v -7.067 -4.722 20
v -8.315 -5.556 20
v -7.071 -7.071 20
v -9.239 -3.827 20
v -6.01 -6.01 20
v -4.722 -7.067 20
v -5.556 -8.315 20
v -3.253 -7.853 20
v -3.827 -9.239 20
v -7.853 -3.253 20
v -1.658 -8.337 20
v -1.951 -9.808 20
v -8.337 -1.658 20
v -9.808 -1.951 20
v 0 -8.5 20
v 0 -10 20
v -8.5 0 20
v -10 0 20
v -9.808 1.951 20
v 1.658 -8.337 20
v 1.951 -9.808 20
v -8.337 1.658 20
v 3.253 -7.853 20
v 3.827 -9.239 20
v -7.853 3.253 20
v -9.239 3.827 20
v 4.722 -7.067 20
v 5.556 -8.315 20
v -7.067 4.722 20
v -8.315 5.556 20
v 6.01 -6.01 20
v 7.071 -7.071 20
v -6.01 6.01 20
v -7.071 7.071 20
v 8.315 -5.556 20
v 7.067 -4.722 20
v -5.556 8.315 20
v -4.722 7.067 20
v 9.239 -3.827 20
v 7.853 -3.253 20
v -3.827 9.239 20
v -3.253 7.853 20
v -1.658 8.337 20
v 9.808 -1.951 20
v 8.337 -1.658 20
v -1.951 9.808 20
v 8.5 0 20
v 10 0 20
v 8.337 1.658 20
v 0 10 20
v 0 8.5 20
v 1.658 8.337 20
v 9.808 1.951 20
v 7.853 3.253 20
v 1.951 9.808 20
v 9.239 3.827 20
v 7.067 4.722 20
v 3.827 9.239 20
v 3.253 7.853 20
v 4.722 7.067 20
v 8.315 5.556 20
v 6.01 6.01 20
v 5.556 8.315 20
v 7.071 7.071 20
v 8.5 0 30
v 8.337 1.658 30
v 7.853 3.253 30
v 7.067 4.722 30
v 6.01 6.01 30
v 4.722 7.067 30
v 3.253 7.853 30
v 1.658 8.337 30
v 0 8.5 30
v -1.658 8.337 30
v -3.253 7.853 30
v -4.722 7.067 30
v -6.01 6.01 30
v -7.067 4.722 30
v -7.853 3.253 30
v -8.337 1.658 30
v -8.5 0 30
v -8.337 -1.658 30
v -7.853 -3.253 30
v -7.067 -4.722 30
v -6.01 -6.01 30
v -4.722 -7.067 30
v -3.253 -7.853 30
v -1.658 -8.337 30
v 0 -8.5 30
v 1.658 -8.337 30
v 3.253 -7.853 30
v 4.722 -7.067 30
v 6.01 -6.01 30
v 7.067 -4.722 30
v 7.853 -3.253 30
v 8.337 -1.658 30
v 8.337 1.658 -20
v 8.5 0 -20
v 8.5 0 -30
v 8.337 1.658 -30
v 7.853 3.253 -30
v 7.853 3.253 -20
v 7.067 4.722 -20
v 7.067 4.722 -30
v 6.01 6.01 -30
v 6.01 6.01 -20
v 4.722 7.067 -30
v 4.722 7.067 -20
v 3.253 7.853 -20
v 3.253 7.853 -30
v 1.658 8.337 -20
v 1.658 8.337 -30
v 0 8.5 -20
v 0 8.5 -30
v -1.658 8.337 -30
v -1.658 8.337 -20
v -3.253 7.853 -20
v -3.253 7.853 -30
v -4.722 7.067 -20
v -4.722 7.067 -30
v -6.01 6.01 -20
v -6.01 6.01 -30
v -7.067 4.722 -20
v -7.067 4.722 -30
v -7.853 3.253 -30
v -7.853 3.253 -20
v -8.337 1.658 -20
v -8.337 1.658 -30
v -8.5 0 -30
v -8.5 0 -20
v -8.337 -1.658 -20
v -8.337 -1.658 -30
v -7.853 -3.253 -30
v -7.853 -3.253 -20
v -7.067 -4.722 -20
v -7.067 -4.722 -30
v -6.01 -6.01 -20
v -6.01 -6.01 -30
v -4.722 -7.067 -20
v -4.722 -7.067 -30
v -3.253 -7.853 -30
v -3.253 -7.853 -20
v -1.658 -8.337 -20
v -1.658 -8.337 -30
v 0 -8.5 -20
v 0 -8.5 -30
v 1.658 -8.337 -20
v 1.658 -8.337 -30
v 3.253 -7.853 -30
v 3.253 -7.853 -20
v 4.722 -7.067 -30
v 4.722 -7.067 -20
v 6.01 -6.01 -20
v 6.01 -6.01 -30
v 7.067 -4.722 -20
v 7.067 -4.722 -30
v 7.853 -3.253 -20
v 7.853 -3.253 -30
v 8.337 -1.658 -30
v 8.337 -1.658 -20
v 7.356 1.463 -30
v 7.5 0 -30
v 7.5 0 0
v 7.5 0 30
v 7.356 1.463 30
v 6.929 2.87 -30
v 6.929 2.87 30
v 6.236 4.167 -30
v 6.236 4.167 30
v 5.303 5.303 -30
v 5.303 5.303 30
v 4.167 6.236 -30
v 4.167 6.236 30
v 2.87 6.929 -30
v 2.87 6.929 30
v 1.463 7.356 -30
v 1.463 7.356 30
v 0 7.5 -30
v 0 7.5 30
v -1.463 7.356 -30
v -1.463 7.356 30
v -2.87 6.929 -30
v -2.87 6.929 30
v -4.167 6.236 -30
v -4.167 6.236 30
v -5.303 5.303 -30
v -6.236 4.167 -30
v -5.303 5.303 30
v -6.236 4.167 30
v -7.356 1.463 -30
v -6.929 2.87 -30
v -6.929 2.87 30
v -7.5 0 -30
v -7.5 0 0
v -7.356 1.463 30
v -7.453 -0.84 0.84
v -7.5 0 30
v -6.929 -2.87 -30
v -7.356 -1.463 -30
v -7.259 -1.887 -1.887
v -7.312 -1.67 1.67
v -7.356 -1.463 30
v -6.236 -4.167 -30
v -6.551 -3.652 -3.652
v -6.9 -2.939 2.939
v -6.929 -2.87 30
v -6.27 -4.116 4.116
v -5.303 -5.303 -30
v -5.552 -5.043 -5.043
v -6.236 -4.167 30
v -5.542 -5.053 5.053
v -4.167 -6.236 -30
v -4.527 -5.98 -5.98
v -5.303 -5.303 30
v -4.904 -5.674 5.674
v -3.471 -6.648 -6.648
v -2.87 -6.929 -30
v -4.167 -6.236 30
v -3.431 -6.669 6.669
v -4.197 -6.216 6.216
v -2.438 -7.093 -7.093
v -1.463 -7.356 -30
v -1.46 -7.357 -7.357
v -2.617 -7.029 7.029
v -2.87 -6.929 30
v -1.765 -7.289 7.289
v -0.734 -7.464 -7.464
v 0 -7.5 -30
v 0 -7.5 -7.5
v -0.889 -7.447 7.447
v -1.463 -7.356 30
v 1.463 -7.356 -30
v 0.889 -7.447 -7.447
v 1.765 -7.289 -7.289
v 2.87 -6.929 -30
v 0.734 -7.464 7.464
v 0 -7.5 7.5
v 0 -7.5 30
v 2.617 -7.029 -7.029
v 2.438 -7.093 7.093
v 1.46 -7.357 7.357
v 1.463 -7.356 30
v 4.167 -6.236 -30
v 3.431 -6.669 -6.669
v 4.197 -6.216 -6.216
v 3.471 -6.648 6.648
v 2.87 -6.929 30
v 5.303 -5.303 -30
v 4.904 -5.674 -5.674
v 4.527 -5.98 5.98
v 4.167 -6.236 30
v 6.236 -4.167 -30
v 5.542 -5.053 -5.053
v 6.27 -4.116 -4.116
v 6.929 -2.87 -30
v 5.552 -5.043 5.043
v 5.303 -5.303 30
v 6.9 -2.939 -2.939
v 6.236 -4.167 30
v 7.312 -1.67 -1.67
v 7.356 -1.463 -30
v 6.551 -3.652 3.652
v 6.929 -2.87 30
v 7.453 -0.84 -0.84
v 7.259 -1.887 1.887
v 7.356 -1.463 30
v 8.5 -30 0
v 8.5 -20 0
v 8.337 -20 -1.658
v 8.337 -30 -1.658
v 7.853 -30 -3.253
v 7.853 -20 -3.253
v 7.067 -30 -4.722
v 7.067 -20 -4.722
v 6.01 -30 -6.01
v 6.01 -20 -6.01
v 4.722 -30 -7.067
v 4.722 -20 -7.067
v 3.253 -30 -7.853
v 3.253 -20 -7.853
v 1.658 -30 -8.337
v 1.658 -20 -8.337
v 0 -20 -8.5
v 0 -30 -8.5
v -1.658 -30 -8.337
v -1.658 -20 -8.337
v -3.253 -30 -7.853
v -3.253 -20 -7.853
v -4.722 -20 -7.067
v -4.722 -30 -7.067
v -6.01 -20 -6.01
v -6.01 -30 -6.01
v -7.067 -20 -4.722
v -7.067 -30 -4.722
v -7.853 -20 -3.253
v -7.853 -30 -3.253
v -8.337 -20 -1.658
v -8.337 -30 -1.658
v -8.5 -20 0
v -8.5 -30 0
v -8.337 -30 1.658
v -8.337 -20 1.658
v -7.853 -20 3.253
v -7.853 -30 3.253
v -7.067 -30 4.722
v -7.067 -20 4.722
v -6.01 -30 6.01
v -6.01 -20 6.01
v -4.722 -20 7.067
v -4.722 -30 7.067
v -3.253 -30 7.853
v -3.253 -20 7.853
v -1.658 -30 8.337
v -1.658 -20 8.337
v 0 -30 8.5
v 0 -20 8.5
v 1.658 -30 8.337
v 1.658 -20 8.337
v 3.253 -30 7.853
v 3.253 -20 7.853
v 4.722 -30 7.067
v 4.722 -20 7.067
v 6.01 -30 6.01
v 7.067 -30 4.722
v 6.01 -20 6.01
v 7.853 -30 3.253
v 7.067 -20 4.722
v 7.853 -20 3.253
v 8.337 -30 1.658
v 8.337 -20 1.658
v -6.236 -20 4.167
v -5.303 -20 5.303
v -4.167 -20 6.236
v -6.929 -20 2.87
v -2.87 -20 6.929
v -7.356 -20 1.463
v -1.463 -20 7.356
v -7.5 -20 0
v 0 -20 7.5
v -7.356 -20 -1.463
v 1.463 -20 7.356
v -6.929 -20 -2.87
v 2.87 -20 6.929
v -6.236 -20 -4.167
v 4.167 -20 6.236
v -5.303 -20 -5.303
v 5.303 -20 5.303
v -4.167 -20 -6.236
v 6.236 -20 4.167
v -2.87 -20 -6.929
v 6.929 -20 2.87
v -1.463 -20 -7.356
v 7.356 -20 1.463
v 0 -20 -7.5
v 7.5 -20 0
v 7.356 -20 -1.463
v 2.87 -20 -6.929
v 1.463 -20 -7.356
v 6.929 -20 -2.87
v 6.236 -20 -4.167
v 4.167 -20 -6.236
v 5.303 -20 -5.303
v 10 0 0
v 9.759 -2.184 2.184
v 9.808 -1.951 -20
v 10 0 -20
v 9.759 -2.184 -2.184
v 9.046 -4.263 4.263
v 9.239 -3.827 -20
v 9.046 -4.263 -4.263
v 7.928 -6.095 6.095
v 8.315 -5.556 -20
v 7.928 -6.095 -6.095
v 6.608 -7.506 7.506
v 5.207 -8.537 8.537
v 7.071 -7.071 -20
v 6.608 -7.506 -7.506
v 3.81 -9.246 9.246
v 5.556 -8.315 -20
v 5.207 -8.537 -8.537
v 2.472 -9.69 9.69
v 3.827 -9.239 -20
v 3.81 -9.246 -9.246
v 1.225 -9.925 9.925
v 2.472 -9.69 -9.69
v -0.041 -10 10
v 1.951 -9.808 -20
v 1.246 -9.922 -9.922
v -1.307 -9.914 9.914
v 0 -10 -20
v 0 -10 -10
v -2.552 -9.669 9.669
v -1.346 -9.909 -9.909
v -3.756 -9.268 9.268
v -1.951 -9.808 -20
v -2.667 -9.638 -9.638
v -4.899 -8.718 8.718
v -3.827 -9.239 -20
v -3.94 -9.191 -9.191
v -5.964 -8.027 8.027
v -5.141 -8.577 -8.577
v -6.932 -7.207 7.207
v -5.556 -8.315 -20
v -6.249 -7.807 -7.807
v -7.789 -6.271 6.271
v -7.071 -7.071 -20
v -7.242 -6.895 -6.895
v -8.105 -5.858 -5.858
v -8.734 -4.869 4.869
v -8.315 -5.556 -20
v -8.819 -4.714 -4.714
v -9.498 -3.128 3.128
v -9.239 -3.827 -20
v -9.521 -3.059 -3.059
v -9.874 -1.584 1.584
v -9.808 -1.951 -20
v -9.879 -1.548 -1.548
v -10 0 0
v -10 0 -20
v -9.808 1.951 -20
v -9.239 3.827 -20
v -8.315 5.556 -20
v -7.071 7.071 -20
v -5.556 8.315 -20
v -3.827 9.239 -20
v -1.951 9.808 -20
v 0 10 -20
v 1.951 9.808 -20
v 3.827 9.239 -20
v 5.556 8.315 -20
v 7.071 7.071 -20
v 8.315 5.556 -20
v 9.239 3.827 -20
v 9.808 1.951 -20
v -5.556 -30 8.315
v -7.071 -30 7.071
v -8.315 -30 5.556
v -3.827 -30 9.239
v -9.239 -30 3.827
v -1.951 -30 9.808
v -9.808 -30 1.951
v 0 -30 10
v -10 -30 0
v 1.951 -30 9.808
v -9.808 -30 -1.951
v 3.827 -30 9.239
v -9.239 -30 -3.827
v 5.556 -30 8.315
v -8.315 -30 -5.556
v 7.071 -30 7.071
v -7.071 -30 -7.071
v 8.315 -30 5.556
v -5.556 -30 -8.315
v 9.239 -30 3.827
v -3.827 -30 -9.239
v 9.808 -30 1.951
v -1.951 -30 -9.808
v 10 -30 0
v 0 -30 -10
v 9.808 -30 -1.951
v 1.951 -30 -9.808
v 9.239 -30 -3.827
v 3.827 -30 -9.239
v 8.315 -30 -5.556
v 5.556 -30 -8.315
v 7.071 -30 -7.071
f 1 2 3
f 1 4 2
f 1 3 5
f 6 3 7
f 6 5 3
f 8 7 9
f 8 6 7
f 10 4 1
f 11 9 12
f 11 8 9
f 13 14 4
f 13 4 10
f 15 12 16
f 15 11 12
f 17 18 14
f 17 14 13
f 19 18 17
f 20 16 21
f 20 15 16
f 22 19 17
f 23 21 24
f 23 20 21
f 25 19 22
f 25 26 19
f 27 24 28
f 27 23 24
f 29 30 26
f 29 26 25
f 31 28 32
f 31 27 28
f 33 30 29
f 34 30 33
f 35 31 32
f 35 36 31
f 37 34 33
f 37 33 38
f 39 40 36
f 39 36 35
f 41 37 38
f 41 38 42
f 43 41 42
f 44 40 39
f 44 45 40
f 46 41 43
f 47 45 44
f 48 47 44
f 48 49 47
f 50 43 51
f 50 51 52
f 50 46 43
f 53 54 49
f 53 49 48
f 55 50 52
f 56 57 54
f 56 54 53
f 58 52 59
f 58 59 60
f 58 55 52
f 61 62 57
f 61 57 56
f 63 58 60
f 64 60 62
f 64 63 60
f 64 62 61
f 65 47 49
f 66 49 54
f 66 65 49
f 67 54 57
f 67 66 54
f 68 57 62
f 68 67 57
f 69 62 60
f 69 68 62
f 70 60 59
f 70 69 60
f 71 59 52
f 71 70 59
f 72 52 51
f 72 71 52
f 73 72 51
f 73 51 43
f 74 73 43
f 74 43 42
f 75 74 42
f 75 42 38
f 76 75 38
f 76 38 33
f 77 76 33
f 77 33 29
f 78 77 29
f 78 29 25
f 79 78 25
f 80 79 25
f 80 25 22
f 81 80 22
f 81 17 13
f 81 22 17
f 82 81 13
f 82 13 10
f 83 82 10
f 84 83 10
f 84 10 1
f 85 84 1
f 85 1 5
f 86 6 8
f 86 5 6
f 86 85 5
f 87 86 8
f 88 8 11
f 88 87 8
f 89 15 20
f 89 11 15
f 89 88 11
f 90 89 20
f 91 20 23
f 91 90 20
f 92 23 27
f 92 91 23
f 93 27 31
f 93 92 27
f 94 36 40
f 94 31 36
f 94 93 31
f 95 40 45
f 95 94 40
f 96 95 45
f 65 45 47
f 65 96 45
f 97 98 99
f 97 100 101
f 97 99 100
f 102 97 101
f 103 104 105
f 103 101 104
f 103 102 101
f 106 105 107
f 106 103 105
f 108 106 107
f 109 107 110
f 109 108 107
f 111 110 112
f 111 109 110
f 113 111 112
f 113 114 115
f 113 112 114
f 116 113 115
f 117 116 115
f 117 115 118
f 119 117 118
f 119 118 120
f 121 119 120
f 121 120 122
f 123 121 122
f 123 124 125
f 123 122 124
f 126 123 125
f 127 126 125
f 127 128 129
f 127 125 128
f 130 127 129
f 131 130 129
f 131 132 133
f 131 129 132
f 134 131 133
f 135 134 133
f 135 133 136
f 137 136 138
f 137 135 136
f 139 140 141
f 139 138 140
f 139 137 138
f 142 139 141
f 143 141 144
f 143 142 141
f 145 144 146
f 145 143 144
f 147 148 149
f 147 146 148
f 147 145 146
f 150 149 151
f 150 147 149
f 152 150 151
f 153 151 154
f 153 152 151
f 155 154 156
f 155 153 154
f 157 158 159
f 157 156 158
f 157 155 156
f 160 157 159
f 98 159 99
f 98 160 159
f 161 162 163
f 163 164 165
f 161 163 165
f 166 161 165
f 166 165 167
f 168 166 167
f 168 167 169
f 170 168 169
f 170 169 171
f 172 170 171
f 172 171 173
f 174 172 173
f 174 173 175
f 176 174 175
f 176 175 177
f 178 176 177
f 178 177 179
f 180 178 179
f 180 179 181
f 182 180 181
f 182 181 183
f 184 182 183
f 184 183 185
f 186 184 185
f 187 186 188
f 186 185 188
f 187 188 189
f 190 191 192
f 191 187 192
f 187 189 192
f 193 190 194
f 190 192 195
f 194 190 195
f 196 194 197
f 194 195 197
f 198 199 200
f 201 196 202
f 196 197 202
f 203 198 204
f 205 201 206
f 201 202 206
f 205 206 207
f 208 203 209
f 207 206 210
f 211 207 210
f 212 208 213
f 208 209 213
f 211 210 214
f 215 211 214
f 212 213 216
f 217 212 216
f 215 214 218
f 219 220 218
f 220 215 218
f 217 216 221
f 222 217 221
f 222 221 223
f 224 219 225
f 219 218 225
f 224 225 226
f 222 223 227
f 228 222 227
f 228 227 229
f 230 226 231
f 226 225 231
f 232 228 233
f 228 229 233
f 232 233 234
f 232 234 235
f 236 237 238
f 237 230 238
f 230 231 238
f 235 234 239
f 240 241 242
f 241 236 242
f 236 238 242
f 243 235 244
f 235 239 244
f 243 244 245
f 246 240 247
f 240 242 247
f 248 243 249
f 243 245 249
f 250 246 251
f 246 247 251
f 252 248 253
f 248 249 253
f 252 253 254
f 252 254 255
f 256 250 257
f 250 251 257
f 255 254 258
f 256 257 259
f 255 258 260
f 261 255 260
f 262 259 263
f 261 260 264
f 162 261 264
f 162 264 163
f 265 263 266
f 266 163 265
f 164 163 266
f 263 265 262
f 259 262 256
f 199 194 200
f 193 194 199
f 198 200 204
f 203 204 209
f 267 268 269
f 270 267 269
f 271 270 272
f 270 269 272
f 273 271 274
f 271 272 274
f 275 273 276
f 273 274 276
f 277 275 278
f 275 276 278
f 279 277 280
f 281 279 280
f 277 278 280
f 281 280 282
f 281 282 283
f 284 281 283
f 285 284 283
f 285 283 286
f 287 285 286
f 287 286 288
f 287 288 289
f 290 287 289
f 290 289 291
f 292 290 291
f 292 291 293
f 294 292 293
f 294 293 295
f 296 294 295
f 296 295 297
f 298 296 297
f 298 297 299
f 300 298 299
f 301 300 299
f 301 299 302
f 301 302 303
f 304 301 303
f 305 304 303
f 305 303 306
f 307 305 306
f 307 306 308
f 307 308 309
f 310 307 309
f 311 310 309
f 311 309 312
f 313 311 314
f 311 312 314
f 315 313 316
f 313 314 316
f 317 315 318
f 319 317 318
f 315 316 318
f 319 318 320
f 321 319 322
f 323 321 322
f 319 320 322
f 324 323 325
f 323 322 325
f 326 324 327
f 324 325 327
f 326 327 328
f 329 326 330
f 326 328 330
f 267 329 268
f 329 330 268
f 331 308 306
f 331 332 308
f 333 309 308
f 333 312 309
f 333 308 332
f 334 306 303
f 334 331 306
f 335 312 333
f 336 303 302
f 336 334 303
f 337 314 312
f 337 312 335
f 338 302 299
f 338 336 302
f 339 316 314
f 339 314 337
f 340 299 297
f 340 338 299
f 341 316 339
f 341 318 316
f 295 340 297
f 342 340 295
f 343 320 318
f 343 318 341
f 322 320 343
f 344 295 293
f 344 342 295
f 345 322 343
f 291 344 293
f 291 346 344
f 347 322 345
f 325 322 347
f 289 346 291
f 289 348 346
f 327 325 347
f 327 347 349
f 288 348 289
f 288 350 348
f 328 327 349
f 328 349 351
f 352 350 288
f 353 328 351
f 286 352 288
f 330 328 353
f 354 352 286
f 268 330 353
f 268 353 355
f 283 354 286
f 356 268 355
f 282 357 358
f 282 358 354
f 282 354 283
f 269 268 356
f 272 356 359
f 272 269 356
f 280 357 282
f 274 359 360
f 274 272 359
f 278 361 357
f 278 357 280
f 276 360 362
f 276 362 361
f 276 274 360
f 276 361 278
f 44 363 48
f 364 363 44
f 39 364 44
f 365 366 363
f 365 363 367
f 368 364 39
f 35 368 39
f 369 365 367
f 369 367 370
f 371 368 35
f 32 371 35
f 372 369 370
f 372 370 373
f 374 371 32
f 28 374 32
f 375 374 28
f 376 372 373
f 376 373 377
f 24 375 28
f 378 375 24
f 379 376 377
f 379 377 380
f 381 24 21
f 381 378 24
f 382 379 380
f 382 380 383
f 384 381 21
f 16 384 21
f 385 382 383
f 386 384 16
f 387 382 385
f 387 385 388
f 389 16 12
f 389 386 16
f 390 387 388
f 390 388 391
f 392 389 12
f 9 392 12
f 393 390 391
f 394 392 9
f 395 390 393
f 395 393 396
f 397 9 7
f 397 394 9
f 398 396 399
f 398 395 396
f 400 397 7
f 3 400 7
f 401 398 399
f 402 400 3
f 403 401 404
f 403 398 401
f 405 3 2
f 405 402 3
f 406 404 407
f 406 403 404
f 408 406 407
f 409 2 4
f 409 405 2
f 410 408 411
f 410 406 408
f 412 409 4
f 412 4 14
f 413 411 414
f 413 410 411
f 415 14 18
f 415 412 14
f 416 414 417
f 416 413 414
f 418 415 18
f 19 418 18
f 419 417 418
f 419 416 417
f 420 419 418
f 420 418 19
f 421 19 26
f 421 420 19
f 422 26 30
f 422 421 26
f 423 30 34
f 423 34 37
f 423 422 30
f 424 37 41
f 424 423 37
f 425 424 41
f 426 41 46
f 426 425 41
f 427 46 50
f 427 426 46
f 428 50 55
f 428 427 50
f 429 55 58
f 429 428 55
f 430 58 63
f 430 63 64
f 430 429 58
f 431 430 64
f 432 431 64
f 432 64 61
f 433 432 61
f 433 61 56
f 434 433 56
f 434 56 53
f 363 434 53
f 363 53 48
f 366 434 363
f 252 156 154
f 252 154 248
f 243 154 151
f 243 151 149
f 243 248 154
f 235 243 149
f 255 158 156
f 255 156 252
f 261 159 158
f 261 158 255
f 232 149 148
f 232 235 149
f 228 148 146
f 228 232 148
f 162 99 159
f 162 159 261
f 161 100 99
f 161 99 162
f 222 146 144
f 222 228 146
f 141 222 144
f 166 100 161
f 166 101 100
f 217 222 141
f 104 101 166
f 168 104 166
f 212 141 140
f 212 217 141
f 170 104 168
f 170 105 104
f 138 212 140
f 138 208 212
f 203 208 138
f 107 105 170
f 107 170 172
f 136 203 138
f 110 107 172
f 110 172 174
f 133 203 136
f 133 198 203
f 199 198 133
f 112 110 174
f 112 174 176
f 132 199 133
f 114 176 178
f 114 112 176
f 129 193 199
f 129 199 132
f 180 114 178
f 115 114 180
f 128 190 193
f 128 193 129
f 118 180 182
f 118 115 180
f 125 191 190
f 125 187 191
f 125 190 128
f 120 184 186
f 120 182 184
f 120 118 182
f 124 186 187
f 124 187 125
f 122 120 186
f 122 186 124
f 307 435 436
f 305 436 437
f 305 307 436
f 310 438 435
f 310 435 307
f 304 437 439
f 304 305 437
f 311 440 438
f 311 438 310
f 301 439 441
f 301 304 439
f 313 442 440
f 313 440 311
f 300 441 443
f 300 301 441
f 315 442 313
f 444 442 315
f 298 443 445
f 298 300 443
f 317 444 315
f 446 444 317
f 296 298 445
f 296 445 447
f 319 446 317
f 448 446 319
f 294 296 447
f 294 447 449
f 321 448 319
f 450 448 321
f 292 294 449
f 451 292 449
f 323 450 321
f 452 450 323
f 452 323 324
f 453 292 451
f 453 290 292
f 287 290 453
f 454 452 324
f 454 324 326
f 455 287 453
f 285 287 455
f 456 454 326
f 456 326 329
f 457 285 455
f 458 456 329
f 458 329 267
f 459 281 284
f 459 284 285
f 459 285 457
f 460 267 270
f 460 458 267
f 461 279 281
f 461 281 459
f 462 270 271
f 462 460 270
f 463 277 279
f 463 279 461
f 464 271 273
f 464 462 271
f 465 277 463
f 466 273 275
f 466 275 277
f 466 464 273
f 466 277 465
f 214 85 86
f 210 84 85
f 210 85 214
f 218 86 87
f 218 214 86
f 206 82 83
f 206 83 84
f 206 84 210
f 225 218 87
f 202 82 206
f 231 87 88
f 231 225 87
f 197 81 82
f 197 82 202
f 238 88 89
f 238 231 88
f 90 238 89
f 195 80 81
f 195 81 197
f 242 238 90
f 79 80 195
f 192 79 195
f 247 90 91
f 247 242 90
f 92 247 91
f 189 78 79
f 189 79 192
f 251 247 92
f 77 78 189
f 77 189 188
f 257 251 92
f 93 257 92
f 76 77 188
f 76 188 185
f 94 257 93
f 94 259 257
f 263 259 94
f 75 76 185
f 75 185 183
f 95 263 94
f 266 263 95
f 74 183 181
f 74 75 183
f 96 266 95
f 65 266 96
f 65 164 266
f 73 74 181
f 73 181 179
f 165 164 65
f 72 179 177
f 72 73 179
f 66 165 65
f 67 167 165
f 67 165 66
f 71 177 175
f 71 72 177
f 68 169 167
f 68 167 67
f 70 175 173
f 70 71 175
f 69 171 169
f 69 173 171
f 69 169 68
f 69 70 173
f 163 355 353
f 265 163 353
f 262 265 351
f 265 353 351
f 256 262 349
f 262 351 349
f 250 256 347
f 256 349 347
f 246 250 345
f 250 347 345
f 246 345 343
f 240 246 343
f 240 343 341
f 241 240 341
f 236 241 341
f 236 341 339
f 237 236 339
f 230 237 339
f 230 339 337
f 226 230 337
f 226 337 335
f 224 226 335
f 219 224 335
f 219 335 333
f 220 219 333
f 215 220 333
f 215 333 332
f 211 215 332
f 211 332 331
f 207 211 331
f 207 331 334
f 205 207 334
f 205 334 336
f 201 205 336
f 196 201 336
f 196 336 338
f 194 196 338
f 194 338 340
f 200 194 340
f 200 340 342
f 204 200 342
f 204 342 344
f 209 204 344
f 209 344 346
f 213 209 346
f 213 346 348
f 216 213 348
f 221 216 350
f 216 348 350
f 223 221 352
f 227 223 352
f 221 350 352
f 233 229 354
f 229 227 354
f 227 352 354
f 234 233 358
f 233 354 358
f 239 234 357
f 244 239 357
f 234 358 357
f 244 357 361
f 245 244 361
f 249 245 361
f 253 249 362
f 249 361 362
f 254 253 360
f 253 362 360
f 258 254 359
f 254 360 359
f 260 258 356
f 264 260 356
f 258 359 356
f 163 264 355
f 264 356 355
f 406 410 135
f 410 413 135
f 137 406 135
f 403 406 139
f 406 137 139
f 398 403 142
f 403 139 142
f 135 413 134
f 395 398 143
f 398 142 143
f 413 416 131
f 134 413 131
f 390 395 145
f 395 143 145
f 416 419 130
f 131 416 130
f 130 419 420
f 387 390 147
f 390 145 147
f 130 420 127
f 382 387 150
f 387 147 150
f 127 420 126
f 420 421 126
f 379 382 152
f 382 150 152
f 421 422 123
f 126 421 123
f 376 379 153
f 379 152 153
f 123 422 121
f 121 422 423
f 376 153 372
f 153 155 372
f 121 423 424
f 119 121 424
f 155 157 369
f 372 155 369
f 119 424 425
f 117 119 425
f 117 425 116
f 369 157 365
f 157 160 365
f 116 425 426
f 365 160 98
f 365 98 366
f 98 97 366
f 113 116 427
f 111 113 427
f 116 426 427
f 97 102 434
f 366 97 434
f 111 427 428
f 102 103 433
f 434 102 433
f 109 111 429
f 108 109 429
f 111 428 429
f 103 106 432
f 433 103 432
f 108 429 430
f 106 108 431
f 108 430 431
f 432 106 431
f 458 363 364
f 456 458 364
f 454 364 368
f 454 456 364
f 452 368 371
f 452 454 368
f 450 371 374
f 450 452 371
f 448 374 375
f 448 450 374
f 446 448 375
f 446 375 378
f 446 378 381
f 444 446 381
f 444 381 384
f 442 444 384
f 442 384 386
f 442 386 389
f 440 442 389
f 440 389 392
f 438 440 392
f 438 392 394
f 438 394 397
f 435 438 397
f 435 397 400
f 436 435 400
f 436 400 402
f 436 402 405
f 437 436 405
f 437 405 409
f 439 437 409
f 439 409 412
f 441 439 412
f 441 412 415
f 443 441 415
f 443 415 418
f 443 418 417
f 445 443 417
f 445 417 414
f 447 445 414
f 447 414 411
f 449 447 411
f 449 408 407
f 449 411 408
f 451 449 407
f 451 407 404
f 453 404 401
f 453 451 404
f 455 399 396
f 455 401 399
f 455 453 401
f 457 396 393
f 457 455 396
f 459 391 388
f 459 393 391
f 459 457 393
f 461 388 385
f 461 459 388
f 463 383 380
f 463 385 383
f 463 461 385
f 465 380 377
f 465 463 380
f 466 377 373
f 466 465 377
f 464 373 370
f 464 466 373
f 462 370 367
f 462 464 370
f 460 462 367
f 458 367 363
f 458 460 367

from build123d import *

# Parameters (mm, degrees)
F0_R        = 8.5
F0_R_2      = 7.5
F2_FACE_R   = 8.5
F2_FACE_R_2 = 7.5
F0_R_3      = 10
F6_R        = 10
F9_R        = 7.5
F14_R       = 8.5
F14_R_2     = 7.5
F12_R       = 7.5


with BuildPart() as f2:
    # F2: sweep along a path in F1
    with BuildLine(Plane.YZ) as f2_path:
        Line((0, 0), (0, 30))
    # F0 (on Top) → F2 (sweep)
    with BuildSketch(Plane.XY):
        Circle(F0_R)
        Circle(F0_R_2, mode=Mode.SUBTRACT)
    sweep(path=f2_path.line)

    # F4: sweep along a path in F1
    with BuildLine(Plane.YZ) as f4_path:
        Line((0, 30), (0, 0))
        Line((0, 0), (0, -30))
    # F2_face (on face) → F4 (sweep)
    with BuildSketch(Plane(origin=(0, 0, 0), x_dir=(1, 0, 0), z_dir=(0, 0, -1))):
        Circle(F2_FACE_R)
        Circle(F2_FACE_R_2, mode=Mode.SUBTRACT)
    sweep(path=f4_path.line)

    # F5: sweep along a path in F3
    with BuildLine(Plane.XZ) as f5_path:
        Line((0, 20), (0, 0))
        Line((0, 0), (0, -20))
    # F0 (on Top) → F5 (sweep)
    with BuildSketch(Plane.XY):
        Circle(F0_R_3)
        Circle(F0_R, mode=Mode.SUBTRACT)
    sweep(path=f5_path.line)

    # F8: sweep along a path in F7
    with BuildLine(Plane.YZ) as f8_path:
        Line((0, 0), (-30, 0))
    # F6 (on Front) → F8 (sweep, cut)
    with BuildSketch(Plane.XZ):
        Circle(F6_R)
    sweep(path=f8_path.line, mode=Mode.SUBTRACT)

    # F10: sweep along a path in F7
    with BuildLine(Plane.YZ) as f10_path:
        Line((0, 0), (-30, 0))
    # F6 (on Front) → F10 (sweep)
    with BuildSketch(Plane.XZ):
        Circle(F6_R)
    sweep(path=f10_path.line)

    # F11: sweep along a path in F7
    with BuildLine(Plane.YZ) as f11_path:
        Line((0, 0), (-30, 0))
    # F9 (on face) → F11 (sweep, cut)
    with BuildSketch(Plane.XZ):
        Circle(F9_R)
    sweep(path=f11_path.line, mode=Mode.SUBTRACT)

    # F15: sweep along a path in F13
    with BuildLine(Plane.XY) as f15_path:
        Line((0, -30), (0, -20))
    # F14 (on face) → F15 (sweep, cut)
    with BuildSketch(Plane.XZ.offset(30)):
        Circle(F14_R)
        Circle(F14_R_2, mode=Mode.SUBTRACT)
    sweep(path=f15_path.line, mode=Mode.SUBTRACT)

    # F16: sweep along a path in F3
    with BuildLine(Plane.XZ) as f16_path:
        Line((0, 20), (0, 0))
        Line((0, 0), (0, -20))
    # F12 (on Top) → F16 (sweep, cut)
    with BuildSketch(Plane.XY):
        Circle(F12_R)
    sweep(path=f16_path.line, mode=Mode.SUBTRACT)

    # F17: sweep along a path in F1
    with BuildLine(Plane.YZ) as f17_path:
        Line((0, 30), (0, 0))
        Line((0, 0), (0, -30))
    # F12 (on Top) → F17 (sweep, cut)
    with BuildSketch(Plane.XY):
        Circle(F12_R)
    sweep(path=f17_path.line, mode=Mode.SUBTRACT)


solid = f2.part
